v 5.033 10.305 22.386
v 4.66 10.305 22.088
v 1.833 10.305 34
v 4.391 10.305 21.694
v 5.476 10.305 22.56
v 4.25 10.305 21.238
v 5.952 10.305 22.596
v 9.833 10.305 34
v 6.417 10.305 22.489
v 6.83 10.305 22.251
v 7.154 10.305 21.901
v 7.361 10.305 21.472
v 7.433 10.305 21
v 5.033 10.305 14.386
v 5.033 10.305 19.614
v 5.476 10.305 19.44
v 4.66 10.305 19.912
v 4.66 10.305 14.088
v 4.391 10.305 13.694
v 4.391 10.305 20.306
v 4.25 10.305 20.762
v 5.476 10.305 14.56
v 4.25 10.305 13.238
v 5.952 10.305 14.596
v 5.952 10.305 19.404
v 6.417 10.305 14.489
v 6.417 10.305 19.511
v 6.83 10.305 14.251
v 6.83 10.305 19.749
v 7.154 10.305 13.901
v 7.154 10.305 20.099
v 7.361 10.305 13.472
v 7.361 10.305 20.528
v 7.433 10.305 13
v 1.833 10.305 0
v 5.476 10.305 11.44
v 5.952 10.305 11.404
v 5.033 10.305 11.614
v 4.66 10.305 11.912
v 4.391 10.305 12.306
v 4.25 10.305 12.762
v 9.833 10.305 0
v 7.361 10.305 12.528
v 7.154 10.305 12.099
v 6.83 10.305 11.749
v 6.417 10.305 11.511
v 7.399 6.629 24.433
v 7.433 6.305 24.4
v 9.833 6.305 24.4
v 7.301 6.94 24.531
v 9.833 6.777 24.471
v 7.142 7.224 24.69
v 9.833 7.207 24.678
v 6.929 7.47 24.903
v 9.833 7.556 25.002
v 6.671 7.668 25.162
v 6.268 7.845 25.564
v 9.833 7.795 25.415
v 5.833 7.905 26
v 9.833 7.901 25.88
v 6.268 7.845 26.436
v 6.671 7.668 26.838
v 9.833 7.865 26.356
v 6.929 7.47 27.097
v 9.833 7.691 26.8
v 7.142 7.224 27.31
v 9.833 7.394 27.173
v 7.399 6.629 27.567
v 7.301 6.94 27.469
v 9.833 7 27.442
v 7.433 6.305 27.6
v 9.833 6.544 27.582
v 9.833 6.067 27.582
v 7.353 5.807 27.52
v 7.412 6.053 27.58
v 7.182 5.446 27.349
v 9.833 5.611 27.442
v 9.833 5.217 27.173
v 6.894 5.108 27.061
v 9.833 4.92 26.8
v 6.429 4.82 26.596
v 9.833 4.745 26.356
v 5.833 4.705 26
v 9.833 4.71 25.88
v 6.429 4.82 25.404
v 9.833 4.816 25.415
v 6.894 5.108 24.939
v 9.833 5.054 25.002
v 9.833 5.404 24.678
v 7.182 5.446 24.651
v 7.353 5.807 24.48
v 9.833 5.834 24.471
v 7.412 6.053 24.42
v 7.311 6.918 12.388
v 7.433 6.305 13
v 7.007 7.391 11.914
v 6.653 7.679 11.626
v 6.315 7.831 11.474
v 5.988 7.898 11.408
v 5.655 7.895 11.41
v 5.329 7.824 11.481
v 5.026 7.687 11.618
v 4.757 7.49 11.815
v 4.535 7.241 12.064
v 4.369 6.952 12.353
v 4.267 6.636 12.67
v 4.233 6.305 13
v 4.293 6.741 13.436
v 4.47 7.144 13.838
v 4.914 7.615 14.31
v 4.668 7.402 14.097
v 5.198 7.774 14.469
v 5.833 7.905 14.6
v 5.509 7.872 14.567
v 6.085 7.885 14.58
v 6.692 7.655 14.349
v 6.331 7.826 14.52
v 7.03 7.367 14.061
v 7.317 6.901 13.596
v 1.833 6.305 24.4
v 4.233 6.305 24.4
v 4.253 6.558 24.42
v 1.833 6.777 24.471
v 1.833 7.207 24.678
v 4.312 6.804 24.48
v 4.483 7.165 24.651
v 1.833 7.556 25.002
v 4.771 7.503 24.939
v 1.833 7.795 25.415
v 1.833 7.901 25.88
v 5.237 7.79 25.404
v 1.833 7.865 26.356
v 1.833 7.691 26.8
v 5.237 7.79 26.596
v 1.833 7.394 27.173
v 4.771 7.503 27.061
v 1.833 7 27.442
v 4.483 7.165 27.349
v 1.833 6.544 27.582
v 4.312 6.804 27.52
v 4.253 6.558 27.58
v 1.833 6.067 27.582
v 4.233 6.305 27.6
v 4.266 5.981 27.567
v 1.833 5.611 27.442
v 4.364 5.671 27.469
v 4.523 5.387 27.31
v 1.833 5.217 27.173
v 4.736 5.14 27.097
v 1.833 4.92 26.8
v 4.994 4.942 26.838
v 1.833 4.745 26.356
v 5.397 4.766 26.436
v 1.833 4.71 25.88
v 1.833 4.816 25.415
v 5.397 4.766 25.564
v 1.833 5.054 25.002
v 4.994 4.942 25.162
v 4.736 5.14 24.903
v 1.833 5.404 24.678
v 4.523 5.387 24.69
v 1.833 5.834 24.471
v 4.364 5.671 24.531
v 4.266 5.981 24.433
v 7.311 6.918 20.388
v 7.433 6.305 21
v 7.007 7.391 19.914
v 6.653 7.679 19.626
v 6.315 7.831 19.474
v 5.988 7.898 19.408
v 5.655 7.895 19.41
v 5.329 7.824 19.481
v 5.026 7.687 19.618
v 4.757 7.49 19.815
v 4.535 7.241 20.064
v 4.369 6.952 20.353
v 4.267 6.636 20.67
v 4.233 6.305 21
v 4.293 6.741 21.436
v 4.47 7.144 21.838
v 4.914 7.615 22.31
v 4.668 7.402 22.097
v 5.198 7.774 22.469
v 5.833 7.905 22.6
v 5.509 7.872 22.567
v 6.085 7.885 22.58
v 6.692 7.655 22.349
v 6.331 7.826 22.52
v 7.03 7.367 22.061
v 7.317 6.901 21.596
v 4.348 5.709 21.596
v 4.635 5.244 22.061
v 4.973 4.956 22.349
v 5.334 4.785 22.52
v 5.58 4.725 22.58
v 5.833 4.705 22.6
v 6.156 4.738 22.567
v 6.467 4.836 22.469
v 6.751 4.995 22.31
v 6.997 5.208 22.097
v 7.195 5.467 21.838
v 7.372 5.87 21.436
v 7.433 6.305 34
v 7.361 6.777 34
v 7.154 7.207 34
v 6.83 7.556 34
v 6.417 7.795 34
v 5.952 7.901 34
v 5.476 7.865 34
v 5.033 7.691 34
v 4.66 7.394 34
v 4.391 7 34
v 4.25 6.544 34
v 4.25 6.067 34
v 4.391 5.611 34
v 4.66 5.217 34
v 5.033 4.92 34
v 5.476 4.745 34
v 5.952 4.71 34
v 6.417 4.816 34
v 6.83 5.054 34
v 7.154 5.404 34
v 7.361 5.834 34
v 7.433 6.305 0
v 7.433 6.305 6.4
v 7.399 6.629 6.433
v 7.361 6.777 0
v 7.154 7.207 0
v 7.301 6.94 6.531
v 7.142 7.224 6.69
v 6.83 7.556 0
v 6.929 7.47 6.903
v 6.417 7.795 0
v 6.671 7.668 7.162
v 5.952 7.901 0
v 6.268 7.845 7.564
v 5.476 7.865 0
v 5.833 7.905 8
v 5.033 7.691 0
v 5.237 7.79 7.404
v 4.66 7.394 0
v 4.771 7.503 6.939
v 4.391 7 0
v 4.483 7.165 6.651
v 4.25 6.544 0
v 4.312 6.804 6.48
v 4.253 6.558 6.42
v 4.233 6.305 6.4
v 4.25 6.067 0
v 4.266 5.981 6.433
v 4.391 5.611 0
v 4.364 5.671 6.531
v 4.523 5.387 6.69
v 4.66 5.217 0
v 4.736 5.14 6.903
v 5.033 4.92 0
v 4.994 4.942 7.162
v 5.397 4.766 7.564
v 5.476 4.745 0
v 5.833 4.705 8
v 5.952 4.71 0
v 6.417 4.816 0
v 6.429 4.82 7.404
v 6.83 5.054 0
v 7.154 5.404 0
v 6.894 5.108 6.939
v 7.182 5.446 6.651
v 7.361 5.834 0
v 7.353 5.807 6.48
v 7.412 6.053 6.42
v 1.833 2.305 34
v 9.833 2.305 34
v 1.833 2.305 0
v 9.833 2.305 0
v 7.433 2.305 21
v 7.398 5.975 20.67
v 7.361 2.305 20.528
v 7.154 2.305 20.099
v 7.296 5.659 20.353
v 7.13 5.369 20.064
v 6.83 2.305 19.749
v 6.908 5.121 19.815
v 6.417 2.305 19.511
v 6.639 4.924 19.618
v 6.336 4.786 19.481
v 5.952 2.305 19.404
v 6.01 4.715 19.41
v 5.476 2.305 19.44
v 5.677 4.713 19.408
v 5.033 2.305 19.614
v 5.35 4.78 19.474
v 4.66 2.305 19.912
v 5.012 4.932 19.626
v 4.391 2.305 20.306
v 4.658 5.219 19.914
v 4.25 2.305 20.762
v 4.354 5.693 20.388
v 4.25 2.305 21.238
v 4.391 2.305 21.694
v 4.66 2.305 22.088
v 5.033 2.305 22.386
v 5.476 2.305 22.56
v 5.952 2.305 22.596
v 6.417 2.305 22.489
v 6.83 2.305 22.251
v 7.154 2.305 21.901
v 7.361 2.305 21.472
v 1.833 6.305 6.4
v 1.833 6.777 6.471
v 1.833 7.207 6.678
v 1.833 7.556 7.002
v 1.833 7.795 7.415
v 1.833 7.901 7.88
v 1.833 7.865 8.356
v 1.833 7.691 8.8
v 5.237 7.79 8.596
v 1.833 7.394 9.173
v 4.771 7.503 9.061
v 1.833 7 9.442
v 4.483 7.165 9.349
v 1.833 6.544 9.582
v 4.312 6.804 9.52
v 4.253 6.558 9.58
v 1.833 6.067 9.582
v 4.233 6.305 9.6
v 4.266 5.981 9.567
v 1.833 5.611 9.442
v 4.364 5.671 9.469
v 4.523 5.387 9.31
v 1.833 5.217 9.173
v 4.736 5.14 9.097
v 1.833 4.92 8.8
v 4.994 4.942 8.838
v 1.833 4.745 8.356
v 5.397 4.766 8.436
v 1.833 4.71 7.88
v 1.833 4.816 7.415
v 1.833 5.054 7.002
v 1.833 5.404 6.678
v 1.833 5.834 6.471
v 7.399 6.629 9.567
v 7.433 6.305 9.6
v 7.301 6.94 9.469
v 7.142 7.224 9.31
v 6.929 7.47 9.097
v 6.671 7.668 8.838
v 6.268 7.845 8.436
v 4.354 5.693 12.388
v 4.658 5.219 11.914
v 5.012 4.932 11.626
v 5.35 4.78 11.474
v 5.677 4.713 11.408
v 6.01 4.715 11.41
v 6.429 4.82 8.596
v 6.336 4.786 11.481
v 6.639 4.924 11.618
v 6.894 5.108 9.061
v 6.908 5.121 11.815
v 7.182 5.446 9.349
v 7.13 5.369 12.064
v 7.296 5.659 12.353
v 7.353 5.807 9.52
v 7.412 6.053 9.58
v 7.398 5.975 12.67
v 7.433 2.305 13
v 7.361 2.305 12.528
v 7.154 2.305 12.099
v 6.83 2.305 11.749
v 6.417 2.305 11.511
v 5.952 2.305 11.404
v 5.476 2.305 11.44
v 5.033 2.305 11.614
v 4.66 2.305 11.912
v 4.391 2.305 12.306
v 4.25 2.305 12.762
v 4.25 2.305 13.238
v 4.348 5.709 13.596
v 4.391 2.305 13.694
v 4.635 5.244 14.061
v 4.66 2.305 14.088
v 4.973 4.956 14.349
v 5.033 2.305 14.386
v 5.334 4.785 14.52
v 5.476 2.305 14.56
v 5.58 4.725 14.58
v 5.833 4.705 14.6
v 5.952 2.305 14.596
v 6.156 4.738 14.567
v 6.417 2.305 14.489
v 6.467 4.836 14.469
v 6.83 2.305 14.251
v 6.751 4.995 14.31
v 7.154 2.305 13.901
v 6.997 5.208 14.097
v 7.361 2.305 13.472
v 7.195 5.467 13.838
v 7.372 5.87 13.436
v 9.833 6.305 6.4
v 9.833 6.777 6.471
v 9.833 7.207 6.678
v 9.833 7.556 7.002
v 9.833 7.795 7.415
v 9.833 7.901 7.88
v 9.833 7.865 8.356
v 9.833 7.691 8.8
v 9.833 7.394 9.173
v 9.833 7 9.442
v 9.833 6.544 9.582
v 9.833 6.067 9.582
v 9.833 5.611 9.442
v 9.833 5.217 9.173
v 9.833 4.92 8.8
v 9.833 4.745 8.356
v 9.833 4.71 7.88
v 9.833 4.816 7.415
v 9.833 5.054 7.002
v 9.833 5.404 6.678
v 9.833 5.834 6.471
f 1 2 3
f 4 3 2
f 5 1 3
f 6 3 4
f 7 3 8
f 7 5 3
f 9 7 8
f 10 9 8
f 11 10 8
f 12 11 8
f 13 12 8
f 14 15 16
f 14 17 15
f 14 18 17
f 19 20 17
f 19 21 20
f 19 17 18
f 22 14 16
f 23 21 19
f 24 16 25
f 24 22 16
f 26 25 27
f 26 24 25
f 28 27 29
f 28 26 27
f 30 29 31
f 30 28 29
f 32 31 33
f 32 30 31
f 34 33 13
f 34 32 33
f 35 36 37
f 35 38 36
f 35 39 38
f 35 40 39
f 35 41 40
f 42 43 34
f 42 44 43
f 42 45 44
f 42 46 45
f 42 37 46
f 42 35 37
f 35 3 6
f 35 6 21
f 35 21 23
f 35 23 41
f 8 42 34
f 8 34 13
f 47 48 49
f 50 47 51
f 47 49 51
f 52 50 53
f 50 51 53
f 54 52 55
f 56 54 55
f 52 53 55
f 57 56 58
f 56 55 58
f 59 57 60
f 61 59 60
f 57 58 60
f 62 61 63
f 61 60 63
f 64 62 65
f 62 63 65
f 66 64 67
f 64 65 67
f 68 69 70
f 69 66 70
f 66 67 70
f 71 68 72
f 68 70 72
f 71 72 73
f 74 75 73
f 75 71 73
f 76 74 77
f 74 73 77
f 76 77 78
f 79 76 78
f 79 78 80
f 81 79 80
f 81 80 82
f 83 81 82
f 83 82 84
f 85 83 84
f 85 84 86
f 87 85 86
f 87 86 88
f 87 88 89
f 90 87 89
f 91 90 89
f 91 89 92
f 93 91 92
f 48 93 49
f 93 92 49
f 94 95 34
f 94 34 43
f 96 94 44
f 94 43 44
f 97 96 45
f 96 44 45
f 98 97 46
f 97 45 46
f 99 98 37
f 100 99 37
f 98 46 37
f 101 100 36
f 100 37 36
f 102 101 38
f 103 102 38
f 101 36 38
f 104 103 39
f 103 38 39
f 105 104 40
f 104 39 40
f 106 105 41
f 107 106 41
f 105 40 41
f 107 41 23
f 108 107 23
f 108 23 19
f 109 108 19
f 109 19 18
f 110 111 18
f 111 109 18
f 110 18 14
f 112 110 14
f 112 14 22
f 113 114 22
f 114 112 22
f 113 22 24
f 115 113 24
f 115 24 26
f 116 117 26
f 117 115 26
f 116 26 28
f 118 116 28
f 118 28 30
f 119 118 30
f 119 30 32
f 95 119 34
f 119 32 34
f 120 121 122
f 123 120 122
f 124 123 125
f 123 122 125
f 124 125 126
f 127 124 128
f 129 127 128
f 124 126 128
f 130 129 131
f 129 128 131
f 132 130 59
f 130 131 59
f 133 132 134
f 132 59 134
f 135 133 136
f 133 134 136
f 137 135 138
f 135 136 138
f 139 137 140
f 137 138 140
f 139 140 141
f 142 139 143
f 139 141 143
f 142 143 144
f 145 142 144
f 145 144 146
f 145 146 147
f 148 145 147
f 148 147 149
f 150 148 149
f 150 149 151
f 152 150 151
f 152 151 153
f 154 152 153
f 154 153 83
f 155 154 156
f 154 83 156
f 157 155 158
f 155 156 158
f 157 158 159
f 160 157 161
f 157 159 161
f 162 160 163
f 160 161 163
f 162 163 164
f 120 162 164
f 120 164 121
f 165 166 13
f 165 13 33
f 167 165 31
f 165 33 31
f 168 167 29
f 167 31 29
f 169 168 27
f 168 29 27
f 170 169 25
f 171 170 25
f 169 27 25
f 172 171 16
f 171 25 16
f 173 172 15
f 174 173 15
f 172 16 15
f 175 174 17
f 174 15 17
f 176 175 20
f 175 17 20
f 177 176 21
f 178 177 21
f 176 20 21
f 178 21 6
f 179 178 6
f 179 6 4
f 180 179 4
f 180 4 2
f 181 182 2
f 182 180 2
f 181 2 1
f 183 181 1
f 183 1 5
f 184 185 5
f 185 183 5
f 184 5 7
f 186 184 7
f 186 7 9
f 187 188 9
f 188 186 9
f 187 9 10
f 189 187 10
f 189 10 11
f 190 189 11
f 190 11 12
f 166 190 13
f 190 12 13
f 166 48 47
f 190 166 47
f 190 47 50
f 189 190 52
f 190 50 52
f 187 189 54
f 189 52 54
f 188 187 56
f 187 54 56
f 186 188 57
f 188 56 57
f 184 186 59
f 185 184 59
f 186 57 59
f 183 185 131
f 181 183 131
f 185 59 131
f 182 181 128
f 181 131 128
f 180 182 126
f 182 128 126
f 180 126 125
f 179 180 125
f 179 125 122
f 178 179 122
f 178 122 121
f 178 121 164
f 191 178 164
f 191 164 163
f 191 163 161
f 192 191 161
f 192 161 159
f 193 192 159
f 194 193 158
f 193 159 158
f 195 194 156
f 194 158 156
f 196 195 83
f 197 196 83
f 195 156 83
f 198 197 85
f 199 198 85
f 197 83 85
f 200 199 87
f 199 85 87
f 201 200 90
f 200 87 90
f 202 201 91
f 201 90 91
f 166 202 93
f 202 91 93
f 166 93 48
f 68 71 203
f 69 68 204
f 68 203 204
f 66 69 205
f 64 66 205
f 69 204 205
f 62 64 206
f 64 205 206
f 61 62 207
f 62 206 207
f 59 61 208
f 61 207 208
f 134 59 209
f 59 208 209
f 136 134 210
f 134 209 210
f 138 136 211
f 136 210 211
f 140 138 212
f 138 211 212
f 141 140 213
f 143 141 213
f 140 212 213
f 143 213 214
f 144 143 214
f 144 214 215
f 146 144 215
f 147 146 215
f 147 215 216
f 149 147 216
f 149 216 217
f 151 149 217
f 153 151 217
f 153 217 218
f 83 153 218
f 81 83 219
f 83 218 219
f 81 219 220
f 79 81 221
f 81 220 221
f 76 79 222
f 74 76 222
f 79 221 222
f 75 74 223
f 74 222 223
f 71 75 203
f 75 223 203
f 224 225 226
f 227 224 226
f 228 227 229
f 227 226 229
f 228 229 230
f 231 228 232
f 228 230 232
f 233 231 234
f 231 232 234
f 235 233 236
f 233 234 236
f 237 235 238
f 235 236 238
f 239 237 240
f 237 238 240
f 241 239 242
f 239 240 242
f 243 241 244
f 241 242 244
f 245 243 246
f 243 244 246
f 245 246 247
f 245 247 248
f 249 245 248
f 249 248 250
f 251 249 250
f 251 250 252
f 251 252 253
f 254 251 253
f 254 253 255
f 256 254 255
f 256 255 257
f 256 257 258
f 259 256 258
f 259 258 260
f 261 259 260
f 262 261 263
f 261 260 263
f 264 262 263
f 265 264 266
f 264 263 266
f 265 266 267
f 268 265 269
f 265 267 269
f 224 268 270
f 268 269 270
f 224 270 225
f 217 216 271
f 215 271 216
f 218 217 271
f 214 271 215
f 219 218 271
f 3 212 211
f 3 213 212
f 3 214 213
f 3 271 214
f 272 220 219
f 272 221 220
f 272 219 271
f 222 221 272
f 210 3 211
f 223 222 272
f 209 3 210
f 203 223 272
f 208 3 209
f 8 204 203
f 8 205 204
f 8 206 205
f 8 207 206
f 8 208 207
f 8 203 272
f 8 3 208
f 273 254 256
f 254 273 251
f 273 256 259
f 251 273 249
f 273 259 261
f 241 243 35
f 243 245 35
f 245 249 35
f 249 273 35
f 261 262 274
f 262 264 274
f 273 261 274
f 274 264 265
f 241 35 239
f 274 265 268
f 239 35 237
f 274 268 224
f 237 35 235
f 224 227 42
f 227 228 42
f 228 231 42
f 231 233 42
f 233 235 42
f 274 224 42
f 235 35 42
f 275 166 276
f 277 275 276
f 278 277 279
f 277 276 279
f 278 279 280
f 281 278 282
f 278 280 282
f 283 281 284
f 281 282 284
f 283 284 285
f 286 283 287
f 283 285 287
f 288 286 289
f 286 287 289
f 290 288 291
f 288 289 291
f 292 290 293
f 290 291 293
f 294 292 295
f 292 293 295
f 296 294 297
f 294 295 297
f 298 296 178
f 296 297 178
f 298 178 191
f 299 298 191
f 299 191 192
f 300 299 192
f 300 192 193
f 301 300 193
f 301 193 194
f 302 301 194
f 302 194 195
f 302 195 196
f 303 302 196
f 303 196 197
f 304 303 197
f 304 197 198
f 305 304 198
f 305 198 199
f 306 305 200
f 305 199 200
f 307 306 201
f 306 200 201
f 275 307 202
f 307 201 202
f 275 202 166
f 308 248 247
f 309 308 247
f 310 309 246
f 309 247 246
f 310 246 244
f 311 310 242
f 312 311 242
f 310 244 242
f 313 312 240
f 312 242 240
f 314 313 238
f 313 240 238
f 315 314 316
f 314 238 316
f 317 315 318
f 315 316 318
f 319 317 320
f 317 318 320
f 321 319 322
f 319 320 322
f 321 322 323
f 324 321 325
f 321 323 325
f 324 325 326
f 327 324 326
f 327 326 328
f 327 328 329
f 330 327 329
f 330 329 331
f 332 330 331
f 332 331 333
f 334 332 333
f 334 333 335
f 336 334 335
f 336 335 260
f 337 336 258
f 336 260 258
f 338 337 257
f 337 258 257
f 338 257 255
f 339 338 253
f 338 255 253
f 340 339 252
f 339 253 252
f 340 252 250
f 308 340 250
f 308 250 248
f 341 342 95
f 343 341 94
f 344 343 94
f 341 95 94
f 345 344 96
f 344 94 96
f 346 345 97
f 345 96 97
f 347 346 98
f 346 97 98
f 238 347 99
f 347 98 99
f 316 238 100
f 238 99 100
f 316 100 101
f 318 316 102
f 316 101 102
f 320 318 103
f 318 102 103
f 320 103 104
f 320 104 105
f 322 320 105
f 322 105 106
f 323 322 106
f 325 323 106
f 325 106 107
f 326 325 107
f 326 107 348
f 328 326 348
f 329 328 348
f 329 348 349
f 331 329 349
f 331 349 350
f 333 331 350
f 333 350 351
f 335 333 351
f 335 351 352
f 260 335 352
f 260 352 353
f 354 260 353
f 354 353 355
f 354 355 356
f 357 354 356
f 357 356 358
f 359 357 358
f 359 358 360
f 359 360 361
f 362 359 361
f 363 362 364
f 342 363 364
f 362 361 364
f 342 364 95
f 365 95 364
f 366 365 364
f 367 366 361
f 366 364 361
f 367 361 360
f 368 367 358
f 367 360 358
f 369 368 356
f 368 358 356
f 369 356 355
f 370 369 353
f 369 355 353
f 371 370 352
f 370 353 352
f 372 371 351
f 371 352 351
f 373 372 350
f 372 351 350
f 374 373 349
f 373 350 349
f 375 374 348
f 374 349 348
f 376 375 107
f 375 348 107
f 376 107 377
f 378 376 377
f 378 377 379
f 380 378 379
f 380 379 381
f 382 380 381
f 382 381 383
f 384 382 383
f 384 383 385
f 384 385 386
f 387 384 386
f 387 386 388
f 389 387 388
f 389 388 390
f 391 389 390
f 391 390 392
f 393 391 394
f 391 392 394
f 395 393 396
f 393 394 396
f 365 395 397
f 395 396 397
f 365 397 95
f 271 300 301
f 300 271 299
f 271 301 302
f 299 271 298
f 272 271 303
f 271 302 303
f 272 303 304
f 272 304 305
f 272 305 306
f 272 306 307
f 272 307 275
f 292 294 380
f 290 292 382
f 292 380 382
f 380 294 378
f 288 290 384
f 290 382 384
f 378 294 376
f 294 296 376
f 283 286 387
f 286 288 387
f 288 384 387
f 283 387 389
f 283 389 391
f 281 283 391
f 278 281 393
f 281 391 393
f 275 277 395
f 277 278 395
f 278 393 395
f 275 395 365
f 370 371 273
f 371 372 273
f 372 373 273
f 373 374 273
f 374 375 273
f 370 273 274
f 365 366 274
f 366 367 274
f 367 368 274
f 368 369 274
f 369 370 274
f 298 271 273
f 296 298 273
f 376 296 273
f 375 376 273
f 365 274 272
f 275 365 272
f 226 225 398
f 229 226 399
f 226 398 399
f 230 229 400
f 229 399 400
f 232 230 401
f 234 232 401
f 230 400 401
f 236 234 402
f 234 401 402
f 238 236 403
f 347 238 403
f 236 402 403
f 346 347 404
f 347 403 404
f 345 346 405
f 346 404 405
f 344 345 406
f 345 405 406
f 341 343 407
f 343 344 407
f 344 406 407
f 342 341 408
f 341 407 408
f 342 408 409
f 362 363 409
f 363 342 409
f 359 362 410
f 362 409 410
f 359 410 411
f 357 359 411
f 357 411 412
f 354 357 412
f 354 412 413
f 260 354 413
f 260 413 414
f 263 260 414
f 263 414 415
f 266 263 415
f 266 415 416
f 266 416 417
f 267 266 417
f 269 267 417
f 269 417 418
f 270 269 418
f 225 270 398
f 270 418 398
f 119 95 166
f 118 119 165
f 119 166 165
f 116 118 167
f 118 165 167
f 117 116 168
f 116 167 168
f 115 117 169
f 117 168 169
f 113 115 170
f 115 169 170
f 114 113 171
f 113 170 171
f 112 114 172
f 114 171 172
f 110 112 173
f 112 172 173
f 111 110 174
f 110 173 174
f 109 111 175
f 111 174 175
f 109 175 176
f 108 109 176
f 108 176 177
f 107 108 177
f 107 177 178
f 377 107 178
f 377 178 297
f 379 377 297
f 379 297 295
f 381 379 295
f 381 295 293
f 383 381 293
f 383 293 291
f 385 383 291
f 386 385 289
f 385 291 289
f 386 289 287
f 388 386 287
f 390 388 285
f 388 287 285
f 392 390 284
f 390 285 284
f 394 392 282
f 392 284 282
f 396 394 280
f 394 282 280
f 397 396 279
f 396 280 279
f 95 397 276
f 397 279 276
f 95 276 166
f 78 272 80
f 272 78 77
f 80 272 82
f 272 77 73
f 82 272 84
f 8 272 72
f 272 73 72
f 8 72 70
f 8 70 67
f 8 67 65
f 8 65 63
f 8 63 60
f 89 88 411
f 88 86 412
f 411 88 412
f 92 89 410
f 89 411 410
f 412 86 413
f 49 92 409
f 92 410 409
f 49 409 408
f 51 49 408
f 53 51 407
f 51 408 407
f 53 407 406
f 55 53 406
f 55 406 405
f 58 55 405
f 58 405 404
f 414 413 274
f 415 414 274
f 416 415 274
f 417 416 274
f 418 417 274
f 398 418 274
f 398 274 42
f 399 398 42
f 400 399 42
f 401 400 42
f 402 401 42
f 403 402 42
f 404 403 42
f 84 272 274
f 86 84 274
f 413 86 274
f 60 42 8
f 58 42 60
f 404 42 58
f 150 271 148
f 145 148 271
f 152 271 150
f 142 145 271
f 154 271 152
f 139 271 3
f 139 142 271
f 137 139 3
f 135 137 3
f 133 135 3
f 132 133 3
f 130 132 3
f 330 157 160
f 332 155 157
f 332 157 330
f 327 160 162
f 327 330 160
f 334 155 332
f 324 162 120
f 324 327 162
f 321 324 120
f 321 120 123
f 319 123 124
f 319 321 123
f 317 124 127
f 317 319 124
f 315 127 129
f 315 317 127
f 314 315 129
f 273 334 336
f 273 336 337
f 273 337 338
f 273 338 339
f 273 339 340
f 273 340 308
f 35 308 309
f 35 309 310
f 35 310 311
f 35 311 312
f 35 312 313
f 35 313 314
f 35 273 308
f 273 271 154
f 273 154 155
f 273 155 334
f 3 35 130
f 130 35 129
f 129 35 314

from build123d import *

# Parameters (mm, degrees)
SKETCH_1_W          = 8
SKETCH_1_H          = 8
EXTRUDE_1_DEPTH     = 34
SKETCH_2_R          = 1.6
CUT_EXTRUDE_1_DEPTH = 35
SKETCH_3_R          = 1.6
CUT_EXTRUDE_2_DEPTH = 34
SKETCH_4_R          = 1.6
CUT_EXTRUDE_3_DEPTH = 34


with BuildPart() as part:
    # 草图1 → 凸台-拉伸1 (new body)
    with BuildSketch(Plane.XY):
        with Locations((5.832511347, 6.305290853)):
            Rectangle(SKETCH_1_W, SKETCH_1_H)
    extrude(amount=EXTRUDE_1_DEPTH)

    # 草图2 → 切除-拉伸1 (cut, through all)
    with BuildSketch(Plane.XY.offset(34)):
        with Locations((5.832511347, 6.305290853)):
            Circle(SKETCH_2_R)
    extrude(amount=-CUT_EXTRUDE_1_DEPTH, mode=Mode.SUBTRACT)

    # 草图3 → 切除-拉伸2 (cut)
    with BuildSketch(Plane(origin=(0, 10.305290853, 0), x_dir=(1, 0, 0), z_dir=(0, 1, 0))):
        with Locations((5.832511347, -13)):
            Circle(SKETCH_3_R)
        with Locations((5.832511347, -21)):
            Circle(SKETCH_3_R)
    extrude(amount=-CUT_EXTRUDE_2_DEPTH, mode=Mode.SUBTRACT)

    # 草图4 → 切除-拉伸3 (cut)
    with BuildSketch(Plane(origin=(9.832511347, 0, 0), x_dir=(0, 0, -1), z_dir=(1, 0, 0))):
        with Locations((-26, 6.305290853)):
            Circle(SKETCH_4_R)
        with Locations((-8, 6.305290853)):
            Circle(SKETCH_4_R)
    extrude(amount=-CUT_EXTRUDE_3_DEPTH, mode=Mode.SUBTRACT)


solid = part.part
